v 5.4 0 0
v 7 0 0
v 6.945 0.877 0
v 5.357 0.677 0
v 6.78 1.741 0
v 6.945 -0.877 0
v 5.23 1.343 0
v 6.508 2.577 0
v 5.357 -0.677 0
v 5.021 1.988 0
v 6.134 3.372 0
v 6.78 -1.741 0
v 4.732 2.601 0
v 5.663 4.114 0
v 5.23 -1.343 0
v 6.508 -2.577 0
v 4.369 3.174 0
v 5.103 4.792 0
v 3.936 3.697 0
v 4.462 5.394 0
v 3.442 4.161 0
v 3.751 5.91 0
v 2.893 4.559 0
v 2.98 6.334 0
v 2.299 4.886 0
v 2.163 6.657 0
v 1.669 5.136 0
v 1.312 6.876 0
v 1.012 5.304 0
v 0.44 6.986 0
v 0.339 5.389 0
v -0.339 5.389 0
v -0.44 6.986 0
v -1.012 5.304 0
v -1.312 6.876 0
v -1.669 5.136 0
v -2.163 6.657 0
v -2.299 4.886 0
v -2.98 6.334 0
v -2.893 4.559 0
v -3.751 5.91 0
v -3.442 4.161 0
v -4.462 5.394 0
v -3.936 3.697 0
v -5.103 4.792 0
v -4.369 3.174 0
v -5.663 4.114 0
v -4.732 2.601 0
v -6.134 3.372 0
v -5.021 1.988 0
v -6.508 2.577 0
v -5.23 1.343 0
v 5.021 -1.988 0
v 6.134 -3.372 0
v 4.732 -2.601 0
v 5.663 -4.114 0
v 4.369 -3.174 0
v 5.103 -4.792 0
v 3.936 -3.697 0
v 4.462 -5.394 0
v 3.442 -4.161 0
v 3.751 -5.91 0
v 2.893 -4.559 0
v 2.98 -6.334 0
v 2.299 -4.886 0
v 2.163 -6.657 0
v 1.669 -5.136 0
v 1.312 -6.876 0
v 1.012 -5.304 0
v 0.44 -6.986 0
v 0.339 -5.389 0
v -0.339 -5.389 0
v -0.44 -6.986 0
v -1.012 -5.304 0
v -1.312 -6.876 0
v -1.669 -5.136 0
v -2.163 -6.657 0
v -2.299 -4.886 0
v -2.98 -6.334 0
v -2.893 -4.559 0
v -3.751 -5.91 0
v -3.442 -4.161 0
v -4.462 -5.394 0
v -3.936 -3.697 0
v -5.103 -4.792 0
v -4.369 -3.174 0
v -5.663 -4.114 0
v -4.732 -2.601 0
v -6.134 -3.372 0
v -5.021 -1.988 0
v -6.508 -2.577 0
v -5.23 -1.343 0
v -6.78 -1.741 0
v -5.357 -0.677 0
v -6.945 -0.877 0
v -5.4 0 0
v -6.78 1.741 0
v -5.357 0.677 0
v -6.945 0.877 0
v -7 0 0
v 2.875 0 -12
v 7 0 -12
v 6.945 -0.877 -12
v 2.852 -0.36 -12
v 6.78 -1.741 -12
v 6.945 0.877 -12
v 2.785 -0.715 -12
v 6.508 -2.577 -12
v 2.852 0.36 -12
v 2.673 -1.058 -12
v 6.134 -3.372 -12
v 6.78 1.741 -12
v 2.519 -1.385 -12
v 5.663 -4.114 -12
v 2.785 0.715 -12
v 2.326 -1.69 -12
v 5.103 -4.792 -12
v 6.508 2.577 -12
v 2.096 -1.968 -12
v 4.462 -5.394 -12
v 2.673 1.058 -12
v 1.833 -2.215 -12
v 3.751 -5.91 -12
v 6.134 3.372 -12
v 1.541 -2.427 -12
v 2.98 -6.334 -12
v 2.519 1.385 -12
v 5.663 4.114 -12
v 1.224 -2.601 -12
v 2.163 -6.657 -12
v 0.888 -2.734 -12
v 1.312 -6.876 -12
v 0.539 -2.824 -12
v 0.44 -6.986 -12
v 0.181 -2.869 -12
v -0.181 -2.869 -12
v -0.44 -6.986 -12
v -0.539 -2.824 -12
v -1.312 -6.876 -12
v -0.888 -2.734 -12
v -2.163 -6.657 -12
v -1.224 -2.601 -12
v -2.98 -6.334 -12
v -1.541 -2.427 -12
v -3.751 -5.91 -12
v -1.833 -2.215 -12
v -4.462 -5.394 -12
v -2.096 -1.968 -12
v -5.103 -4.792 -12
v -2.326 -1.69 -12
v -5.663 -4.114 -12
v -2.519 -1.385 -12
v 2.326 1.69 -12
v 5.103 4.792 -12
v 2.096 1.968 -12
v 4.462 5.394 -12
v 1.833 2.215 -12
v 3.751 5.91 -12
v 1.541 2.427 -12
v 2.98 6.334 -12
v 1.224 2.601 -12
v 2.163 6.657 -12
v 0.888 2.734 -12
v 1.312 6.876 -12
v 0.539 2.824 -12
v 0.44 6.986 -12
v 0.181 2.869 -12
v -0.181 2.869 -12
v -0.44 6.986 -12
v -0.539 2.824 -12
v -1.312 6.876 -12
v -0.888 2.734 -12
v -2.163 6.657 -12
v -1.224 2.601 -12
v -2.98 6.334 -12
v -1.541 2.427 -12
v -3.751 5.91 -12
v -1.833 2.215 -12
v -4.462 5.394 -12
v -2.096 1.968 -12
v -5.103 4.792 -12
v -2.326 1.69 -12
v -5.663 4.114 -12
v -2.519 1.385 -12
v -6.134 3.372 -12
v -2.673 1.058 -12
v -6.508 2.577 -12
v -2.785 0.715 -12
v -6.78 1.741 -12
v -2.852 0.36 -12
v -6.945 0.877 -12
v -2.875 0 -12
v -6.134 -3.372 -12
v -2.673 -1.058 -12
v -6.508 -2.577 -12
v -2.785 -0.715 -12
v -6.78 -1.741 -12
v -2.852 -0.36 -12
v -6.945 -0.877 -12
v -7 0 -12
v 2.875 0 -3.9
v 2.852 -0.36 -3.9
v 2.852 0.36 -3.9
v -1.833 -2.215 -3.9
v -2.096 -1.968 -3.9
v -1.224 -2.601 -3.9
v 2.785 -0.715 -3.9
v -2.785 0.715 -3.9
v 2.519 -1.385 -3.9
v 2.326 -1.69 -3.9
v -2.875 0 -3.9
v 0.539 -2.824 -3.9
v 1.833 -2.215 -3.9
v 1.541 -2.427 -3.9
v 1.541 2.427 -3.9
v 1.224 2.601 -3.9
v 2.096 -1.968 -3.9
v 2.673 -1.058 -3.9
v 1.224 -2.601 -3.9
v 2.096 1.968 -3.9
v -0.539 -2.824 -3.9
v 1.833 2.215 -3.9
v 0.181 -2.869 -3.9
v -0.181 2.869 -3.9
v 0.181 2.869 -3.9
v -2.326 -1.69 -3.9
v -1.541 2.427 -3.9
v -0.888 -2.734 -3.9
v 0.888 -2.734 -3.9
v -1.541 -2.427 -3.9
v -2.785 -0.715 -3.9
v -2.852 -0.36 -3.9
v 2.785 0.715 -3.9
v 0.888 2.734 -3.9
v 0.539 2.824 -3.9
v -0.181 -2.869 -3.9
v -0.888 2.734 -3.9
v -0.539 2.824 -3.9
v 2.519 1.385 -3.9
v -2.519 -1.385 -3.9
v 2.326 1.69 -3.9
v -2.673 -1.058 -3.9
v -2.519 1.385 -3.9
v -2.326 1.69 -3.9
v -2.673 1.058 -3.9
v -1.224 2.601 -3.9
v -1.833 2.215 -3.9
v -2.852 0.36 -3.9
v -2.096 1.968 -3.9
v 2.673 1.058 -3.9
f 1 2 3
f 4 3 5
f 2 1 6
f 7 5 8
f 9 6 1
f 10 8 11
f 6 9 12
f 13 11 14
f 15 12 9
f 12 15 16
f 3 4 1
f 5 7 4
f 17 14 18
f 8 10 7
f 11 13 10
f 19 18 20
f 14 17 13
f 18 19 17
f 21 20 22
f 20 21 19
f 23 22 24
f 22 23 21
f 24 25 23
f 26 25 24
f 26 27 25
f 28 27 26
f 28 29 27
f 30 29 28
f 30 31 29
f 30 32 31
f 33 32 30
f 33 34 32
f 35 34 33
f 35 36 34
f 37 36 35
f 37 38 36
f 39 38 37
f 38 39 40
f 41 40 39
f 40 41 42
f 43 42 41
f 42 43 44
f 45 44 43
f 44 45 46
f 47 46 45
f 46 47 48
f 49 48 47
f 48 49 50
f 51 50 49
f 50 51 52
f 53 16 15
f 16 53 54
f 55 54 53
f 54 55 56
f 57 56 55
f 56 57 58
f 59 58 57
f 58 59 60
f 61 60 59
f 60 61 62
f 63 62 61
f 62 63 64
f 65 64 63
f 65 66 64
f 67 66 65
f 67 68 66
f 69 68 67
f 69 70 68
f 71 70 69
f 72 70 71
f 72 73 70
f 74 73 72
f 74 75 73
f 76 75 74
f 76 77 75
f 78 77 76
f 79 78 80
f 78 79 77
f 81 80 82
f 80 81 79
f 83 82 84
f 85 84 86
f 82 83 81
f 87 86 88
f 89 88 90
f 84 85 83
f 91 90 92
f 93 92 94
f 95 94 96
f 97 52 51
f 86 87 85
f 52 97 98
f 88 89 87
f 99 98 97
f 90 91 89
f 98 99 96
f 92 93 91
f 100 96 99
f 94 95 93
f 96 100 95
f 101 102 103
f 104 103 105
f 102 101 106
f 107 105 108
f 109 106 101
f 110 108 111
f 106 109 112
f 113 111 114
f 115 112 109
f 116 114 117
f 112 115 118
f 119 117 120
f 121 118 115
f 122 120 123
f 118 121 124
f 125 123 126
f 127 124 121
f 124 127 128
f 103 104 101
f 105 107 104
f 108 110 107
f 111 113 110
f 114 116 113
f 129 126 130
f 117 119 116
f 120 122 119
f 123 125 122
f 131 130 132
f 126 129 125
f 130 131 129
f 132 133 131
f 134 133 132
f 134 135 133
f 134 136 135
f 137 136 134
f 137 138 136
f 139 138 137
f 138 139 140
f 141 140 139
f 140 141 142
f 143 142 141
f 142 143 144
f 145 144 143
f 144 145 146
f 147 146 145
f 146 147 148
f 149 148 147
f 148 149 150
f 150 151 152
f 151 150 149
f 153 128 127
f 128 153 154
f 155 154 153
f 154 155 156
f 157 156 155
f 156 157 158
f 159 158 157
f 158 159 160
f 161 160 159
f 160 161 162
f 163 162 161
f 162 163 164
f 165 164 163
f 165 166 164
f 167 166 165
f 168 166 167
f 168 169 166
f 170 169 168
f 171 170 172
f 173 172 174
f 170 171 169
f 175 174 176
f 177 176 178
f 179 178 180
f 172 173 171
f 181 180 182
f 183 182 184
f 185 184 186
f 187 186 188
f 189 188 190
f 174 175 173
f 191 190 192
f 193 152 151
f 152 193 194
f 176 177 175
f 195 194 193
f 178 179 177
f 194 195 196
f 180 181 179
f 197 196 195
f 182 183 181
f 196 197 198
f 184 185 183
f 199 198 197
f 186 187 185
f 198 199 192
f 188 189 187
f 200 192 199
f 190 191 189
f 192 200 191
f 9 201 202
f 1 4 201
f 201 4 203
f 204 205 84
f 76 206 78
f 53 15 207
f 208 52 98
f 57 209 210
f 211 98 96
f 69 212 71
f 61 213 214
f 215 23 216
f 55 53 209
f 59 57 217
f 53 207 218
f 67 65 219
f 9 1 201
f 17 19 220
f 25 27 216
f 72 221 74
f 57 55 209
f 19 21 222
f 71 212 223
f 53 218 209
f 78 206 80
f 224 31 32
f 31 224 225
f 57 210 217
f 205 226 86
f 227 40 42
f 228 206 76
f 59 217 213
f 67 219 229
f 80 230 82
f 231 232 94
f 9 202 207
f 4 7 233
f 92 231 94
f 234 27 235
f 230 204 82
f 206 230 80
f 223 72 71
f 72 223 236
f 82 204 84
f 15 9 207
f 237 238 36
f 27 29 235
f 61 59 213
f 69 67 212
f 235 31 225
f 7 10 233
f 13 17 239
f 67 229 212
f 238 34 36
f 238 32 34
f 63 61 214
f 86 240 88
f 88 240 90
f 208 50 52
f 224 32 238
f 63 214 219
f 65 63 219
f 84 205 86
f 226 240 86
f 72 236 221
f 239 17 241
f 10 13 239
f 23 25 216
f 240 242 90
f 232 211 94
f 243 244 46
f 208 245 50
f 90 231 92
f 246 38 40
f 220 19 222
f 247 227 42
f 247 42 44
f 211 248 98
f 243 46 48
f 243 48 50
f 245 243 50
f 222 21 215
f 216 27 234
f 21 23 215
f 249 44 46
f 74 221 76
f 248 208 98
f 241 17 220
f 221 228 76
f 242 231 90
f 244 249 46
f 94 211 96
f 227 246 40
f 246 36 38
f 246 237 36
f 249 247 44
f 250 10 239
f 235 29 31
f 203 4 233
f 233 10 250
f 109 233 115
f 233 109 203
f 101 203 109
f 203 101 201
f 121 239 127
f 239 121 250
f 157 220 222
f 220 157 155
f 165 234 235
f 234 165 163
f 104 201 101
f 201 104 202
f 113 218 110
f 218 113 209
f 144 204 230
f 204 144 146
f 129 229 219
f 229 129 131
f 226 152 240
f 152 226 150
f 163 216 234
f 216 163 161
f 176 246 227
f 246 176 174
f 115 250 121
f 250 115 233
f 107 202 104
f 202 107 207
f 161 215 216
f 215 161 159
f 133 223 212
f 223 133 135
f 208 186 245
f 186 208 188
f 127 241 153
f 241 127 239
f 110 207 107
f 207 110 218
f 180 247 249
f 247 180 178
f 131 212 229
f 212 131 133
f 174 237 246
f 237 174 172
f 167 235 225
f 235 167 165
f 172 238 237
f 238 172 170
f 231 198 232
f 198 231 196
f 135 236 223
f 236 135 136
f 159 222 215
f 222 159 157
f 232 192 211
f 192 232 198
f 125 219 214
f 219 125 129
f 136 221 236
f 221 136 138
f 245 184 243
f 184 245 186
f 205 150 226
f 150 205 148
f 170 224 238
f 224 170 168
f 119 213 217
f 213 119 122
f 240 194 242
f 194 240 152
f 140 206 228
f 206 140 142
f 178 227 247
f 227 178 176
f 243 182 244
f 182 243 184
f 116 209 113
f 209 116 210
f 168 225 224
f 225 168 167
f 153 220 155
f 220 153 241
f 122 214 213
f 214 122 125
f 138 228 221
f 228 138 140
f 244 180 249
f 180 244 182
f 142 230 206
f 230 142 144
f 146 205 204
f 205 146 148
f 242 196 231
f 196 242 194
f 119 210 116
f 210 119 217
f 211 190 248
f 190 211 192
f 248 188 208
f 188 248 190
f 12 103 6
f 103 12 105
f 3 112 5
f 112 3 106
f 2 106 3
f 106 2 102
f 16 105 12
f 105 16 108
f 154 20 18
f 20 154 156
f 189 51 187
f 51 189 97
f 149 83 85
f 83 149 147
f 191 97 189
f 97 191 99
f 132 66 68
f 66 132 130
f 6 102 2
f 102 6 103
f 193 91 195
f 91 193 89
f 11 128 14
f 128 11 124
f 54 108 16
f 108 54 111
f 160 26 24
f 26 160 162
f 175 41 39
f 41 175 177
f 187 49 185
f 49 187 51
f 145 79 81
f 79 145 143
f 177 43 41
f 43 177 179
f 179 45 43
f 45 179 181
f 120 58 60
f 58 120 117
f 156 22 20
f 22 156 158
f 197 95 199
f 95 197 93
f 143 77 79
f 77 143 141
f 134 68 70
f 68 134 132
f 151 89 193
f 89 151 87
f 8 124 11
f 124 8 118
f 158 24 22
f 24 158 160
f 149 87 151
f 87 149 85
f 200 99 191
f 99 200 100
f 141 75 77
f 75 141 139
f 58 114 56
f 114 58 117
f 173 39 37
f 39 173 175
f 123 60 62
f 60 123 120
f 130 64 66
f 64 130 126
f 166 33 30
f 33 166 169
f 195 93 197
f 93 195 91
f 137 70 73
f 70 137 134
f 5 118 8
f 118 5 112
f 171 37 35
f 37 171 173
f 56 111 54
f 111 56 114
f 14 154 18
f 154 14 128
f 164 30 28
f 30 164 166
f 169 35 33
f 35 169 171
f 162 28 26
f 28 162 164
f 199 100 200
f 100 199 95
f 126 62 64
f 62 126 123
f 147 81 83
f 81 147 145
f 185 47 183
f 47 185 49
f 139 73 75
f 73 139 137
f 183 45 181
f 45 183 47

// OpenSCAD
$fn = 50;


difference() {
	union() {
		translate(v = [0, 0, -12.0000000000]) {
			cylinder(h = 12, r = 7.0000000000);
		}
		cylinder(h = 0, r = 13.0000000000);
	}
	union() {
		translate(v = [0, 0, 0]) {
			rotate(a = [0, 0, 0]) {
				difference() {
					union() {
						#translate(v = [0, 0, -12.0000000000]) {
							cylinder(h = 12, r = 2.6000000000);
						}
						#translate(v = [0, 0, -3.9000000000]) {
							cylinder(h = 3.9000000000, r = 7.0000000000, r1 = 2.8750000000, r2 = 5.4000000000);
						}
						#translate(v = [0, 0, -12.0000000000]) {
							cylinder(h = 12, r = 2.8750000000);
						}
						#translate(v = [0, 0, -12.0000000000]) {
							cylinder(h = 12, r = 2.6000000000);
						}
					}
					union();
				}
			}
		}
	}
}
